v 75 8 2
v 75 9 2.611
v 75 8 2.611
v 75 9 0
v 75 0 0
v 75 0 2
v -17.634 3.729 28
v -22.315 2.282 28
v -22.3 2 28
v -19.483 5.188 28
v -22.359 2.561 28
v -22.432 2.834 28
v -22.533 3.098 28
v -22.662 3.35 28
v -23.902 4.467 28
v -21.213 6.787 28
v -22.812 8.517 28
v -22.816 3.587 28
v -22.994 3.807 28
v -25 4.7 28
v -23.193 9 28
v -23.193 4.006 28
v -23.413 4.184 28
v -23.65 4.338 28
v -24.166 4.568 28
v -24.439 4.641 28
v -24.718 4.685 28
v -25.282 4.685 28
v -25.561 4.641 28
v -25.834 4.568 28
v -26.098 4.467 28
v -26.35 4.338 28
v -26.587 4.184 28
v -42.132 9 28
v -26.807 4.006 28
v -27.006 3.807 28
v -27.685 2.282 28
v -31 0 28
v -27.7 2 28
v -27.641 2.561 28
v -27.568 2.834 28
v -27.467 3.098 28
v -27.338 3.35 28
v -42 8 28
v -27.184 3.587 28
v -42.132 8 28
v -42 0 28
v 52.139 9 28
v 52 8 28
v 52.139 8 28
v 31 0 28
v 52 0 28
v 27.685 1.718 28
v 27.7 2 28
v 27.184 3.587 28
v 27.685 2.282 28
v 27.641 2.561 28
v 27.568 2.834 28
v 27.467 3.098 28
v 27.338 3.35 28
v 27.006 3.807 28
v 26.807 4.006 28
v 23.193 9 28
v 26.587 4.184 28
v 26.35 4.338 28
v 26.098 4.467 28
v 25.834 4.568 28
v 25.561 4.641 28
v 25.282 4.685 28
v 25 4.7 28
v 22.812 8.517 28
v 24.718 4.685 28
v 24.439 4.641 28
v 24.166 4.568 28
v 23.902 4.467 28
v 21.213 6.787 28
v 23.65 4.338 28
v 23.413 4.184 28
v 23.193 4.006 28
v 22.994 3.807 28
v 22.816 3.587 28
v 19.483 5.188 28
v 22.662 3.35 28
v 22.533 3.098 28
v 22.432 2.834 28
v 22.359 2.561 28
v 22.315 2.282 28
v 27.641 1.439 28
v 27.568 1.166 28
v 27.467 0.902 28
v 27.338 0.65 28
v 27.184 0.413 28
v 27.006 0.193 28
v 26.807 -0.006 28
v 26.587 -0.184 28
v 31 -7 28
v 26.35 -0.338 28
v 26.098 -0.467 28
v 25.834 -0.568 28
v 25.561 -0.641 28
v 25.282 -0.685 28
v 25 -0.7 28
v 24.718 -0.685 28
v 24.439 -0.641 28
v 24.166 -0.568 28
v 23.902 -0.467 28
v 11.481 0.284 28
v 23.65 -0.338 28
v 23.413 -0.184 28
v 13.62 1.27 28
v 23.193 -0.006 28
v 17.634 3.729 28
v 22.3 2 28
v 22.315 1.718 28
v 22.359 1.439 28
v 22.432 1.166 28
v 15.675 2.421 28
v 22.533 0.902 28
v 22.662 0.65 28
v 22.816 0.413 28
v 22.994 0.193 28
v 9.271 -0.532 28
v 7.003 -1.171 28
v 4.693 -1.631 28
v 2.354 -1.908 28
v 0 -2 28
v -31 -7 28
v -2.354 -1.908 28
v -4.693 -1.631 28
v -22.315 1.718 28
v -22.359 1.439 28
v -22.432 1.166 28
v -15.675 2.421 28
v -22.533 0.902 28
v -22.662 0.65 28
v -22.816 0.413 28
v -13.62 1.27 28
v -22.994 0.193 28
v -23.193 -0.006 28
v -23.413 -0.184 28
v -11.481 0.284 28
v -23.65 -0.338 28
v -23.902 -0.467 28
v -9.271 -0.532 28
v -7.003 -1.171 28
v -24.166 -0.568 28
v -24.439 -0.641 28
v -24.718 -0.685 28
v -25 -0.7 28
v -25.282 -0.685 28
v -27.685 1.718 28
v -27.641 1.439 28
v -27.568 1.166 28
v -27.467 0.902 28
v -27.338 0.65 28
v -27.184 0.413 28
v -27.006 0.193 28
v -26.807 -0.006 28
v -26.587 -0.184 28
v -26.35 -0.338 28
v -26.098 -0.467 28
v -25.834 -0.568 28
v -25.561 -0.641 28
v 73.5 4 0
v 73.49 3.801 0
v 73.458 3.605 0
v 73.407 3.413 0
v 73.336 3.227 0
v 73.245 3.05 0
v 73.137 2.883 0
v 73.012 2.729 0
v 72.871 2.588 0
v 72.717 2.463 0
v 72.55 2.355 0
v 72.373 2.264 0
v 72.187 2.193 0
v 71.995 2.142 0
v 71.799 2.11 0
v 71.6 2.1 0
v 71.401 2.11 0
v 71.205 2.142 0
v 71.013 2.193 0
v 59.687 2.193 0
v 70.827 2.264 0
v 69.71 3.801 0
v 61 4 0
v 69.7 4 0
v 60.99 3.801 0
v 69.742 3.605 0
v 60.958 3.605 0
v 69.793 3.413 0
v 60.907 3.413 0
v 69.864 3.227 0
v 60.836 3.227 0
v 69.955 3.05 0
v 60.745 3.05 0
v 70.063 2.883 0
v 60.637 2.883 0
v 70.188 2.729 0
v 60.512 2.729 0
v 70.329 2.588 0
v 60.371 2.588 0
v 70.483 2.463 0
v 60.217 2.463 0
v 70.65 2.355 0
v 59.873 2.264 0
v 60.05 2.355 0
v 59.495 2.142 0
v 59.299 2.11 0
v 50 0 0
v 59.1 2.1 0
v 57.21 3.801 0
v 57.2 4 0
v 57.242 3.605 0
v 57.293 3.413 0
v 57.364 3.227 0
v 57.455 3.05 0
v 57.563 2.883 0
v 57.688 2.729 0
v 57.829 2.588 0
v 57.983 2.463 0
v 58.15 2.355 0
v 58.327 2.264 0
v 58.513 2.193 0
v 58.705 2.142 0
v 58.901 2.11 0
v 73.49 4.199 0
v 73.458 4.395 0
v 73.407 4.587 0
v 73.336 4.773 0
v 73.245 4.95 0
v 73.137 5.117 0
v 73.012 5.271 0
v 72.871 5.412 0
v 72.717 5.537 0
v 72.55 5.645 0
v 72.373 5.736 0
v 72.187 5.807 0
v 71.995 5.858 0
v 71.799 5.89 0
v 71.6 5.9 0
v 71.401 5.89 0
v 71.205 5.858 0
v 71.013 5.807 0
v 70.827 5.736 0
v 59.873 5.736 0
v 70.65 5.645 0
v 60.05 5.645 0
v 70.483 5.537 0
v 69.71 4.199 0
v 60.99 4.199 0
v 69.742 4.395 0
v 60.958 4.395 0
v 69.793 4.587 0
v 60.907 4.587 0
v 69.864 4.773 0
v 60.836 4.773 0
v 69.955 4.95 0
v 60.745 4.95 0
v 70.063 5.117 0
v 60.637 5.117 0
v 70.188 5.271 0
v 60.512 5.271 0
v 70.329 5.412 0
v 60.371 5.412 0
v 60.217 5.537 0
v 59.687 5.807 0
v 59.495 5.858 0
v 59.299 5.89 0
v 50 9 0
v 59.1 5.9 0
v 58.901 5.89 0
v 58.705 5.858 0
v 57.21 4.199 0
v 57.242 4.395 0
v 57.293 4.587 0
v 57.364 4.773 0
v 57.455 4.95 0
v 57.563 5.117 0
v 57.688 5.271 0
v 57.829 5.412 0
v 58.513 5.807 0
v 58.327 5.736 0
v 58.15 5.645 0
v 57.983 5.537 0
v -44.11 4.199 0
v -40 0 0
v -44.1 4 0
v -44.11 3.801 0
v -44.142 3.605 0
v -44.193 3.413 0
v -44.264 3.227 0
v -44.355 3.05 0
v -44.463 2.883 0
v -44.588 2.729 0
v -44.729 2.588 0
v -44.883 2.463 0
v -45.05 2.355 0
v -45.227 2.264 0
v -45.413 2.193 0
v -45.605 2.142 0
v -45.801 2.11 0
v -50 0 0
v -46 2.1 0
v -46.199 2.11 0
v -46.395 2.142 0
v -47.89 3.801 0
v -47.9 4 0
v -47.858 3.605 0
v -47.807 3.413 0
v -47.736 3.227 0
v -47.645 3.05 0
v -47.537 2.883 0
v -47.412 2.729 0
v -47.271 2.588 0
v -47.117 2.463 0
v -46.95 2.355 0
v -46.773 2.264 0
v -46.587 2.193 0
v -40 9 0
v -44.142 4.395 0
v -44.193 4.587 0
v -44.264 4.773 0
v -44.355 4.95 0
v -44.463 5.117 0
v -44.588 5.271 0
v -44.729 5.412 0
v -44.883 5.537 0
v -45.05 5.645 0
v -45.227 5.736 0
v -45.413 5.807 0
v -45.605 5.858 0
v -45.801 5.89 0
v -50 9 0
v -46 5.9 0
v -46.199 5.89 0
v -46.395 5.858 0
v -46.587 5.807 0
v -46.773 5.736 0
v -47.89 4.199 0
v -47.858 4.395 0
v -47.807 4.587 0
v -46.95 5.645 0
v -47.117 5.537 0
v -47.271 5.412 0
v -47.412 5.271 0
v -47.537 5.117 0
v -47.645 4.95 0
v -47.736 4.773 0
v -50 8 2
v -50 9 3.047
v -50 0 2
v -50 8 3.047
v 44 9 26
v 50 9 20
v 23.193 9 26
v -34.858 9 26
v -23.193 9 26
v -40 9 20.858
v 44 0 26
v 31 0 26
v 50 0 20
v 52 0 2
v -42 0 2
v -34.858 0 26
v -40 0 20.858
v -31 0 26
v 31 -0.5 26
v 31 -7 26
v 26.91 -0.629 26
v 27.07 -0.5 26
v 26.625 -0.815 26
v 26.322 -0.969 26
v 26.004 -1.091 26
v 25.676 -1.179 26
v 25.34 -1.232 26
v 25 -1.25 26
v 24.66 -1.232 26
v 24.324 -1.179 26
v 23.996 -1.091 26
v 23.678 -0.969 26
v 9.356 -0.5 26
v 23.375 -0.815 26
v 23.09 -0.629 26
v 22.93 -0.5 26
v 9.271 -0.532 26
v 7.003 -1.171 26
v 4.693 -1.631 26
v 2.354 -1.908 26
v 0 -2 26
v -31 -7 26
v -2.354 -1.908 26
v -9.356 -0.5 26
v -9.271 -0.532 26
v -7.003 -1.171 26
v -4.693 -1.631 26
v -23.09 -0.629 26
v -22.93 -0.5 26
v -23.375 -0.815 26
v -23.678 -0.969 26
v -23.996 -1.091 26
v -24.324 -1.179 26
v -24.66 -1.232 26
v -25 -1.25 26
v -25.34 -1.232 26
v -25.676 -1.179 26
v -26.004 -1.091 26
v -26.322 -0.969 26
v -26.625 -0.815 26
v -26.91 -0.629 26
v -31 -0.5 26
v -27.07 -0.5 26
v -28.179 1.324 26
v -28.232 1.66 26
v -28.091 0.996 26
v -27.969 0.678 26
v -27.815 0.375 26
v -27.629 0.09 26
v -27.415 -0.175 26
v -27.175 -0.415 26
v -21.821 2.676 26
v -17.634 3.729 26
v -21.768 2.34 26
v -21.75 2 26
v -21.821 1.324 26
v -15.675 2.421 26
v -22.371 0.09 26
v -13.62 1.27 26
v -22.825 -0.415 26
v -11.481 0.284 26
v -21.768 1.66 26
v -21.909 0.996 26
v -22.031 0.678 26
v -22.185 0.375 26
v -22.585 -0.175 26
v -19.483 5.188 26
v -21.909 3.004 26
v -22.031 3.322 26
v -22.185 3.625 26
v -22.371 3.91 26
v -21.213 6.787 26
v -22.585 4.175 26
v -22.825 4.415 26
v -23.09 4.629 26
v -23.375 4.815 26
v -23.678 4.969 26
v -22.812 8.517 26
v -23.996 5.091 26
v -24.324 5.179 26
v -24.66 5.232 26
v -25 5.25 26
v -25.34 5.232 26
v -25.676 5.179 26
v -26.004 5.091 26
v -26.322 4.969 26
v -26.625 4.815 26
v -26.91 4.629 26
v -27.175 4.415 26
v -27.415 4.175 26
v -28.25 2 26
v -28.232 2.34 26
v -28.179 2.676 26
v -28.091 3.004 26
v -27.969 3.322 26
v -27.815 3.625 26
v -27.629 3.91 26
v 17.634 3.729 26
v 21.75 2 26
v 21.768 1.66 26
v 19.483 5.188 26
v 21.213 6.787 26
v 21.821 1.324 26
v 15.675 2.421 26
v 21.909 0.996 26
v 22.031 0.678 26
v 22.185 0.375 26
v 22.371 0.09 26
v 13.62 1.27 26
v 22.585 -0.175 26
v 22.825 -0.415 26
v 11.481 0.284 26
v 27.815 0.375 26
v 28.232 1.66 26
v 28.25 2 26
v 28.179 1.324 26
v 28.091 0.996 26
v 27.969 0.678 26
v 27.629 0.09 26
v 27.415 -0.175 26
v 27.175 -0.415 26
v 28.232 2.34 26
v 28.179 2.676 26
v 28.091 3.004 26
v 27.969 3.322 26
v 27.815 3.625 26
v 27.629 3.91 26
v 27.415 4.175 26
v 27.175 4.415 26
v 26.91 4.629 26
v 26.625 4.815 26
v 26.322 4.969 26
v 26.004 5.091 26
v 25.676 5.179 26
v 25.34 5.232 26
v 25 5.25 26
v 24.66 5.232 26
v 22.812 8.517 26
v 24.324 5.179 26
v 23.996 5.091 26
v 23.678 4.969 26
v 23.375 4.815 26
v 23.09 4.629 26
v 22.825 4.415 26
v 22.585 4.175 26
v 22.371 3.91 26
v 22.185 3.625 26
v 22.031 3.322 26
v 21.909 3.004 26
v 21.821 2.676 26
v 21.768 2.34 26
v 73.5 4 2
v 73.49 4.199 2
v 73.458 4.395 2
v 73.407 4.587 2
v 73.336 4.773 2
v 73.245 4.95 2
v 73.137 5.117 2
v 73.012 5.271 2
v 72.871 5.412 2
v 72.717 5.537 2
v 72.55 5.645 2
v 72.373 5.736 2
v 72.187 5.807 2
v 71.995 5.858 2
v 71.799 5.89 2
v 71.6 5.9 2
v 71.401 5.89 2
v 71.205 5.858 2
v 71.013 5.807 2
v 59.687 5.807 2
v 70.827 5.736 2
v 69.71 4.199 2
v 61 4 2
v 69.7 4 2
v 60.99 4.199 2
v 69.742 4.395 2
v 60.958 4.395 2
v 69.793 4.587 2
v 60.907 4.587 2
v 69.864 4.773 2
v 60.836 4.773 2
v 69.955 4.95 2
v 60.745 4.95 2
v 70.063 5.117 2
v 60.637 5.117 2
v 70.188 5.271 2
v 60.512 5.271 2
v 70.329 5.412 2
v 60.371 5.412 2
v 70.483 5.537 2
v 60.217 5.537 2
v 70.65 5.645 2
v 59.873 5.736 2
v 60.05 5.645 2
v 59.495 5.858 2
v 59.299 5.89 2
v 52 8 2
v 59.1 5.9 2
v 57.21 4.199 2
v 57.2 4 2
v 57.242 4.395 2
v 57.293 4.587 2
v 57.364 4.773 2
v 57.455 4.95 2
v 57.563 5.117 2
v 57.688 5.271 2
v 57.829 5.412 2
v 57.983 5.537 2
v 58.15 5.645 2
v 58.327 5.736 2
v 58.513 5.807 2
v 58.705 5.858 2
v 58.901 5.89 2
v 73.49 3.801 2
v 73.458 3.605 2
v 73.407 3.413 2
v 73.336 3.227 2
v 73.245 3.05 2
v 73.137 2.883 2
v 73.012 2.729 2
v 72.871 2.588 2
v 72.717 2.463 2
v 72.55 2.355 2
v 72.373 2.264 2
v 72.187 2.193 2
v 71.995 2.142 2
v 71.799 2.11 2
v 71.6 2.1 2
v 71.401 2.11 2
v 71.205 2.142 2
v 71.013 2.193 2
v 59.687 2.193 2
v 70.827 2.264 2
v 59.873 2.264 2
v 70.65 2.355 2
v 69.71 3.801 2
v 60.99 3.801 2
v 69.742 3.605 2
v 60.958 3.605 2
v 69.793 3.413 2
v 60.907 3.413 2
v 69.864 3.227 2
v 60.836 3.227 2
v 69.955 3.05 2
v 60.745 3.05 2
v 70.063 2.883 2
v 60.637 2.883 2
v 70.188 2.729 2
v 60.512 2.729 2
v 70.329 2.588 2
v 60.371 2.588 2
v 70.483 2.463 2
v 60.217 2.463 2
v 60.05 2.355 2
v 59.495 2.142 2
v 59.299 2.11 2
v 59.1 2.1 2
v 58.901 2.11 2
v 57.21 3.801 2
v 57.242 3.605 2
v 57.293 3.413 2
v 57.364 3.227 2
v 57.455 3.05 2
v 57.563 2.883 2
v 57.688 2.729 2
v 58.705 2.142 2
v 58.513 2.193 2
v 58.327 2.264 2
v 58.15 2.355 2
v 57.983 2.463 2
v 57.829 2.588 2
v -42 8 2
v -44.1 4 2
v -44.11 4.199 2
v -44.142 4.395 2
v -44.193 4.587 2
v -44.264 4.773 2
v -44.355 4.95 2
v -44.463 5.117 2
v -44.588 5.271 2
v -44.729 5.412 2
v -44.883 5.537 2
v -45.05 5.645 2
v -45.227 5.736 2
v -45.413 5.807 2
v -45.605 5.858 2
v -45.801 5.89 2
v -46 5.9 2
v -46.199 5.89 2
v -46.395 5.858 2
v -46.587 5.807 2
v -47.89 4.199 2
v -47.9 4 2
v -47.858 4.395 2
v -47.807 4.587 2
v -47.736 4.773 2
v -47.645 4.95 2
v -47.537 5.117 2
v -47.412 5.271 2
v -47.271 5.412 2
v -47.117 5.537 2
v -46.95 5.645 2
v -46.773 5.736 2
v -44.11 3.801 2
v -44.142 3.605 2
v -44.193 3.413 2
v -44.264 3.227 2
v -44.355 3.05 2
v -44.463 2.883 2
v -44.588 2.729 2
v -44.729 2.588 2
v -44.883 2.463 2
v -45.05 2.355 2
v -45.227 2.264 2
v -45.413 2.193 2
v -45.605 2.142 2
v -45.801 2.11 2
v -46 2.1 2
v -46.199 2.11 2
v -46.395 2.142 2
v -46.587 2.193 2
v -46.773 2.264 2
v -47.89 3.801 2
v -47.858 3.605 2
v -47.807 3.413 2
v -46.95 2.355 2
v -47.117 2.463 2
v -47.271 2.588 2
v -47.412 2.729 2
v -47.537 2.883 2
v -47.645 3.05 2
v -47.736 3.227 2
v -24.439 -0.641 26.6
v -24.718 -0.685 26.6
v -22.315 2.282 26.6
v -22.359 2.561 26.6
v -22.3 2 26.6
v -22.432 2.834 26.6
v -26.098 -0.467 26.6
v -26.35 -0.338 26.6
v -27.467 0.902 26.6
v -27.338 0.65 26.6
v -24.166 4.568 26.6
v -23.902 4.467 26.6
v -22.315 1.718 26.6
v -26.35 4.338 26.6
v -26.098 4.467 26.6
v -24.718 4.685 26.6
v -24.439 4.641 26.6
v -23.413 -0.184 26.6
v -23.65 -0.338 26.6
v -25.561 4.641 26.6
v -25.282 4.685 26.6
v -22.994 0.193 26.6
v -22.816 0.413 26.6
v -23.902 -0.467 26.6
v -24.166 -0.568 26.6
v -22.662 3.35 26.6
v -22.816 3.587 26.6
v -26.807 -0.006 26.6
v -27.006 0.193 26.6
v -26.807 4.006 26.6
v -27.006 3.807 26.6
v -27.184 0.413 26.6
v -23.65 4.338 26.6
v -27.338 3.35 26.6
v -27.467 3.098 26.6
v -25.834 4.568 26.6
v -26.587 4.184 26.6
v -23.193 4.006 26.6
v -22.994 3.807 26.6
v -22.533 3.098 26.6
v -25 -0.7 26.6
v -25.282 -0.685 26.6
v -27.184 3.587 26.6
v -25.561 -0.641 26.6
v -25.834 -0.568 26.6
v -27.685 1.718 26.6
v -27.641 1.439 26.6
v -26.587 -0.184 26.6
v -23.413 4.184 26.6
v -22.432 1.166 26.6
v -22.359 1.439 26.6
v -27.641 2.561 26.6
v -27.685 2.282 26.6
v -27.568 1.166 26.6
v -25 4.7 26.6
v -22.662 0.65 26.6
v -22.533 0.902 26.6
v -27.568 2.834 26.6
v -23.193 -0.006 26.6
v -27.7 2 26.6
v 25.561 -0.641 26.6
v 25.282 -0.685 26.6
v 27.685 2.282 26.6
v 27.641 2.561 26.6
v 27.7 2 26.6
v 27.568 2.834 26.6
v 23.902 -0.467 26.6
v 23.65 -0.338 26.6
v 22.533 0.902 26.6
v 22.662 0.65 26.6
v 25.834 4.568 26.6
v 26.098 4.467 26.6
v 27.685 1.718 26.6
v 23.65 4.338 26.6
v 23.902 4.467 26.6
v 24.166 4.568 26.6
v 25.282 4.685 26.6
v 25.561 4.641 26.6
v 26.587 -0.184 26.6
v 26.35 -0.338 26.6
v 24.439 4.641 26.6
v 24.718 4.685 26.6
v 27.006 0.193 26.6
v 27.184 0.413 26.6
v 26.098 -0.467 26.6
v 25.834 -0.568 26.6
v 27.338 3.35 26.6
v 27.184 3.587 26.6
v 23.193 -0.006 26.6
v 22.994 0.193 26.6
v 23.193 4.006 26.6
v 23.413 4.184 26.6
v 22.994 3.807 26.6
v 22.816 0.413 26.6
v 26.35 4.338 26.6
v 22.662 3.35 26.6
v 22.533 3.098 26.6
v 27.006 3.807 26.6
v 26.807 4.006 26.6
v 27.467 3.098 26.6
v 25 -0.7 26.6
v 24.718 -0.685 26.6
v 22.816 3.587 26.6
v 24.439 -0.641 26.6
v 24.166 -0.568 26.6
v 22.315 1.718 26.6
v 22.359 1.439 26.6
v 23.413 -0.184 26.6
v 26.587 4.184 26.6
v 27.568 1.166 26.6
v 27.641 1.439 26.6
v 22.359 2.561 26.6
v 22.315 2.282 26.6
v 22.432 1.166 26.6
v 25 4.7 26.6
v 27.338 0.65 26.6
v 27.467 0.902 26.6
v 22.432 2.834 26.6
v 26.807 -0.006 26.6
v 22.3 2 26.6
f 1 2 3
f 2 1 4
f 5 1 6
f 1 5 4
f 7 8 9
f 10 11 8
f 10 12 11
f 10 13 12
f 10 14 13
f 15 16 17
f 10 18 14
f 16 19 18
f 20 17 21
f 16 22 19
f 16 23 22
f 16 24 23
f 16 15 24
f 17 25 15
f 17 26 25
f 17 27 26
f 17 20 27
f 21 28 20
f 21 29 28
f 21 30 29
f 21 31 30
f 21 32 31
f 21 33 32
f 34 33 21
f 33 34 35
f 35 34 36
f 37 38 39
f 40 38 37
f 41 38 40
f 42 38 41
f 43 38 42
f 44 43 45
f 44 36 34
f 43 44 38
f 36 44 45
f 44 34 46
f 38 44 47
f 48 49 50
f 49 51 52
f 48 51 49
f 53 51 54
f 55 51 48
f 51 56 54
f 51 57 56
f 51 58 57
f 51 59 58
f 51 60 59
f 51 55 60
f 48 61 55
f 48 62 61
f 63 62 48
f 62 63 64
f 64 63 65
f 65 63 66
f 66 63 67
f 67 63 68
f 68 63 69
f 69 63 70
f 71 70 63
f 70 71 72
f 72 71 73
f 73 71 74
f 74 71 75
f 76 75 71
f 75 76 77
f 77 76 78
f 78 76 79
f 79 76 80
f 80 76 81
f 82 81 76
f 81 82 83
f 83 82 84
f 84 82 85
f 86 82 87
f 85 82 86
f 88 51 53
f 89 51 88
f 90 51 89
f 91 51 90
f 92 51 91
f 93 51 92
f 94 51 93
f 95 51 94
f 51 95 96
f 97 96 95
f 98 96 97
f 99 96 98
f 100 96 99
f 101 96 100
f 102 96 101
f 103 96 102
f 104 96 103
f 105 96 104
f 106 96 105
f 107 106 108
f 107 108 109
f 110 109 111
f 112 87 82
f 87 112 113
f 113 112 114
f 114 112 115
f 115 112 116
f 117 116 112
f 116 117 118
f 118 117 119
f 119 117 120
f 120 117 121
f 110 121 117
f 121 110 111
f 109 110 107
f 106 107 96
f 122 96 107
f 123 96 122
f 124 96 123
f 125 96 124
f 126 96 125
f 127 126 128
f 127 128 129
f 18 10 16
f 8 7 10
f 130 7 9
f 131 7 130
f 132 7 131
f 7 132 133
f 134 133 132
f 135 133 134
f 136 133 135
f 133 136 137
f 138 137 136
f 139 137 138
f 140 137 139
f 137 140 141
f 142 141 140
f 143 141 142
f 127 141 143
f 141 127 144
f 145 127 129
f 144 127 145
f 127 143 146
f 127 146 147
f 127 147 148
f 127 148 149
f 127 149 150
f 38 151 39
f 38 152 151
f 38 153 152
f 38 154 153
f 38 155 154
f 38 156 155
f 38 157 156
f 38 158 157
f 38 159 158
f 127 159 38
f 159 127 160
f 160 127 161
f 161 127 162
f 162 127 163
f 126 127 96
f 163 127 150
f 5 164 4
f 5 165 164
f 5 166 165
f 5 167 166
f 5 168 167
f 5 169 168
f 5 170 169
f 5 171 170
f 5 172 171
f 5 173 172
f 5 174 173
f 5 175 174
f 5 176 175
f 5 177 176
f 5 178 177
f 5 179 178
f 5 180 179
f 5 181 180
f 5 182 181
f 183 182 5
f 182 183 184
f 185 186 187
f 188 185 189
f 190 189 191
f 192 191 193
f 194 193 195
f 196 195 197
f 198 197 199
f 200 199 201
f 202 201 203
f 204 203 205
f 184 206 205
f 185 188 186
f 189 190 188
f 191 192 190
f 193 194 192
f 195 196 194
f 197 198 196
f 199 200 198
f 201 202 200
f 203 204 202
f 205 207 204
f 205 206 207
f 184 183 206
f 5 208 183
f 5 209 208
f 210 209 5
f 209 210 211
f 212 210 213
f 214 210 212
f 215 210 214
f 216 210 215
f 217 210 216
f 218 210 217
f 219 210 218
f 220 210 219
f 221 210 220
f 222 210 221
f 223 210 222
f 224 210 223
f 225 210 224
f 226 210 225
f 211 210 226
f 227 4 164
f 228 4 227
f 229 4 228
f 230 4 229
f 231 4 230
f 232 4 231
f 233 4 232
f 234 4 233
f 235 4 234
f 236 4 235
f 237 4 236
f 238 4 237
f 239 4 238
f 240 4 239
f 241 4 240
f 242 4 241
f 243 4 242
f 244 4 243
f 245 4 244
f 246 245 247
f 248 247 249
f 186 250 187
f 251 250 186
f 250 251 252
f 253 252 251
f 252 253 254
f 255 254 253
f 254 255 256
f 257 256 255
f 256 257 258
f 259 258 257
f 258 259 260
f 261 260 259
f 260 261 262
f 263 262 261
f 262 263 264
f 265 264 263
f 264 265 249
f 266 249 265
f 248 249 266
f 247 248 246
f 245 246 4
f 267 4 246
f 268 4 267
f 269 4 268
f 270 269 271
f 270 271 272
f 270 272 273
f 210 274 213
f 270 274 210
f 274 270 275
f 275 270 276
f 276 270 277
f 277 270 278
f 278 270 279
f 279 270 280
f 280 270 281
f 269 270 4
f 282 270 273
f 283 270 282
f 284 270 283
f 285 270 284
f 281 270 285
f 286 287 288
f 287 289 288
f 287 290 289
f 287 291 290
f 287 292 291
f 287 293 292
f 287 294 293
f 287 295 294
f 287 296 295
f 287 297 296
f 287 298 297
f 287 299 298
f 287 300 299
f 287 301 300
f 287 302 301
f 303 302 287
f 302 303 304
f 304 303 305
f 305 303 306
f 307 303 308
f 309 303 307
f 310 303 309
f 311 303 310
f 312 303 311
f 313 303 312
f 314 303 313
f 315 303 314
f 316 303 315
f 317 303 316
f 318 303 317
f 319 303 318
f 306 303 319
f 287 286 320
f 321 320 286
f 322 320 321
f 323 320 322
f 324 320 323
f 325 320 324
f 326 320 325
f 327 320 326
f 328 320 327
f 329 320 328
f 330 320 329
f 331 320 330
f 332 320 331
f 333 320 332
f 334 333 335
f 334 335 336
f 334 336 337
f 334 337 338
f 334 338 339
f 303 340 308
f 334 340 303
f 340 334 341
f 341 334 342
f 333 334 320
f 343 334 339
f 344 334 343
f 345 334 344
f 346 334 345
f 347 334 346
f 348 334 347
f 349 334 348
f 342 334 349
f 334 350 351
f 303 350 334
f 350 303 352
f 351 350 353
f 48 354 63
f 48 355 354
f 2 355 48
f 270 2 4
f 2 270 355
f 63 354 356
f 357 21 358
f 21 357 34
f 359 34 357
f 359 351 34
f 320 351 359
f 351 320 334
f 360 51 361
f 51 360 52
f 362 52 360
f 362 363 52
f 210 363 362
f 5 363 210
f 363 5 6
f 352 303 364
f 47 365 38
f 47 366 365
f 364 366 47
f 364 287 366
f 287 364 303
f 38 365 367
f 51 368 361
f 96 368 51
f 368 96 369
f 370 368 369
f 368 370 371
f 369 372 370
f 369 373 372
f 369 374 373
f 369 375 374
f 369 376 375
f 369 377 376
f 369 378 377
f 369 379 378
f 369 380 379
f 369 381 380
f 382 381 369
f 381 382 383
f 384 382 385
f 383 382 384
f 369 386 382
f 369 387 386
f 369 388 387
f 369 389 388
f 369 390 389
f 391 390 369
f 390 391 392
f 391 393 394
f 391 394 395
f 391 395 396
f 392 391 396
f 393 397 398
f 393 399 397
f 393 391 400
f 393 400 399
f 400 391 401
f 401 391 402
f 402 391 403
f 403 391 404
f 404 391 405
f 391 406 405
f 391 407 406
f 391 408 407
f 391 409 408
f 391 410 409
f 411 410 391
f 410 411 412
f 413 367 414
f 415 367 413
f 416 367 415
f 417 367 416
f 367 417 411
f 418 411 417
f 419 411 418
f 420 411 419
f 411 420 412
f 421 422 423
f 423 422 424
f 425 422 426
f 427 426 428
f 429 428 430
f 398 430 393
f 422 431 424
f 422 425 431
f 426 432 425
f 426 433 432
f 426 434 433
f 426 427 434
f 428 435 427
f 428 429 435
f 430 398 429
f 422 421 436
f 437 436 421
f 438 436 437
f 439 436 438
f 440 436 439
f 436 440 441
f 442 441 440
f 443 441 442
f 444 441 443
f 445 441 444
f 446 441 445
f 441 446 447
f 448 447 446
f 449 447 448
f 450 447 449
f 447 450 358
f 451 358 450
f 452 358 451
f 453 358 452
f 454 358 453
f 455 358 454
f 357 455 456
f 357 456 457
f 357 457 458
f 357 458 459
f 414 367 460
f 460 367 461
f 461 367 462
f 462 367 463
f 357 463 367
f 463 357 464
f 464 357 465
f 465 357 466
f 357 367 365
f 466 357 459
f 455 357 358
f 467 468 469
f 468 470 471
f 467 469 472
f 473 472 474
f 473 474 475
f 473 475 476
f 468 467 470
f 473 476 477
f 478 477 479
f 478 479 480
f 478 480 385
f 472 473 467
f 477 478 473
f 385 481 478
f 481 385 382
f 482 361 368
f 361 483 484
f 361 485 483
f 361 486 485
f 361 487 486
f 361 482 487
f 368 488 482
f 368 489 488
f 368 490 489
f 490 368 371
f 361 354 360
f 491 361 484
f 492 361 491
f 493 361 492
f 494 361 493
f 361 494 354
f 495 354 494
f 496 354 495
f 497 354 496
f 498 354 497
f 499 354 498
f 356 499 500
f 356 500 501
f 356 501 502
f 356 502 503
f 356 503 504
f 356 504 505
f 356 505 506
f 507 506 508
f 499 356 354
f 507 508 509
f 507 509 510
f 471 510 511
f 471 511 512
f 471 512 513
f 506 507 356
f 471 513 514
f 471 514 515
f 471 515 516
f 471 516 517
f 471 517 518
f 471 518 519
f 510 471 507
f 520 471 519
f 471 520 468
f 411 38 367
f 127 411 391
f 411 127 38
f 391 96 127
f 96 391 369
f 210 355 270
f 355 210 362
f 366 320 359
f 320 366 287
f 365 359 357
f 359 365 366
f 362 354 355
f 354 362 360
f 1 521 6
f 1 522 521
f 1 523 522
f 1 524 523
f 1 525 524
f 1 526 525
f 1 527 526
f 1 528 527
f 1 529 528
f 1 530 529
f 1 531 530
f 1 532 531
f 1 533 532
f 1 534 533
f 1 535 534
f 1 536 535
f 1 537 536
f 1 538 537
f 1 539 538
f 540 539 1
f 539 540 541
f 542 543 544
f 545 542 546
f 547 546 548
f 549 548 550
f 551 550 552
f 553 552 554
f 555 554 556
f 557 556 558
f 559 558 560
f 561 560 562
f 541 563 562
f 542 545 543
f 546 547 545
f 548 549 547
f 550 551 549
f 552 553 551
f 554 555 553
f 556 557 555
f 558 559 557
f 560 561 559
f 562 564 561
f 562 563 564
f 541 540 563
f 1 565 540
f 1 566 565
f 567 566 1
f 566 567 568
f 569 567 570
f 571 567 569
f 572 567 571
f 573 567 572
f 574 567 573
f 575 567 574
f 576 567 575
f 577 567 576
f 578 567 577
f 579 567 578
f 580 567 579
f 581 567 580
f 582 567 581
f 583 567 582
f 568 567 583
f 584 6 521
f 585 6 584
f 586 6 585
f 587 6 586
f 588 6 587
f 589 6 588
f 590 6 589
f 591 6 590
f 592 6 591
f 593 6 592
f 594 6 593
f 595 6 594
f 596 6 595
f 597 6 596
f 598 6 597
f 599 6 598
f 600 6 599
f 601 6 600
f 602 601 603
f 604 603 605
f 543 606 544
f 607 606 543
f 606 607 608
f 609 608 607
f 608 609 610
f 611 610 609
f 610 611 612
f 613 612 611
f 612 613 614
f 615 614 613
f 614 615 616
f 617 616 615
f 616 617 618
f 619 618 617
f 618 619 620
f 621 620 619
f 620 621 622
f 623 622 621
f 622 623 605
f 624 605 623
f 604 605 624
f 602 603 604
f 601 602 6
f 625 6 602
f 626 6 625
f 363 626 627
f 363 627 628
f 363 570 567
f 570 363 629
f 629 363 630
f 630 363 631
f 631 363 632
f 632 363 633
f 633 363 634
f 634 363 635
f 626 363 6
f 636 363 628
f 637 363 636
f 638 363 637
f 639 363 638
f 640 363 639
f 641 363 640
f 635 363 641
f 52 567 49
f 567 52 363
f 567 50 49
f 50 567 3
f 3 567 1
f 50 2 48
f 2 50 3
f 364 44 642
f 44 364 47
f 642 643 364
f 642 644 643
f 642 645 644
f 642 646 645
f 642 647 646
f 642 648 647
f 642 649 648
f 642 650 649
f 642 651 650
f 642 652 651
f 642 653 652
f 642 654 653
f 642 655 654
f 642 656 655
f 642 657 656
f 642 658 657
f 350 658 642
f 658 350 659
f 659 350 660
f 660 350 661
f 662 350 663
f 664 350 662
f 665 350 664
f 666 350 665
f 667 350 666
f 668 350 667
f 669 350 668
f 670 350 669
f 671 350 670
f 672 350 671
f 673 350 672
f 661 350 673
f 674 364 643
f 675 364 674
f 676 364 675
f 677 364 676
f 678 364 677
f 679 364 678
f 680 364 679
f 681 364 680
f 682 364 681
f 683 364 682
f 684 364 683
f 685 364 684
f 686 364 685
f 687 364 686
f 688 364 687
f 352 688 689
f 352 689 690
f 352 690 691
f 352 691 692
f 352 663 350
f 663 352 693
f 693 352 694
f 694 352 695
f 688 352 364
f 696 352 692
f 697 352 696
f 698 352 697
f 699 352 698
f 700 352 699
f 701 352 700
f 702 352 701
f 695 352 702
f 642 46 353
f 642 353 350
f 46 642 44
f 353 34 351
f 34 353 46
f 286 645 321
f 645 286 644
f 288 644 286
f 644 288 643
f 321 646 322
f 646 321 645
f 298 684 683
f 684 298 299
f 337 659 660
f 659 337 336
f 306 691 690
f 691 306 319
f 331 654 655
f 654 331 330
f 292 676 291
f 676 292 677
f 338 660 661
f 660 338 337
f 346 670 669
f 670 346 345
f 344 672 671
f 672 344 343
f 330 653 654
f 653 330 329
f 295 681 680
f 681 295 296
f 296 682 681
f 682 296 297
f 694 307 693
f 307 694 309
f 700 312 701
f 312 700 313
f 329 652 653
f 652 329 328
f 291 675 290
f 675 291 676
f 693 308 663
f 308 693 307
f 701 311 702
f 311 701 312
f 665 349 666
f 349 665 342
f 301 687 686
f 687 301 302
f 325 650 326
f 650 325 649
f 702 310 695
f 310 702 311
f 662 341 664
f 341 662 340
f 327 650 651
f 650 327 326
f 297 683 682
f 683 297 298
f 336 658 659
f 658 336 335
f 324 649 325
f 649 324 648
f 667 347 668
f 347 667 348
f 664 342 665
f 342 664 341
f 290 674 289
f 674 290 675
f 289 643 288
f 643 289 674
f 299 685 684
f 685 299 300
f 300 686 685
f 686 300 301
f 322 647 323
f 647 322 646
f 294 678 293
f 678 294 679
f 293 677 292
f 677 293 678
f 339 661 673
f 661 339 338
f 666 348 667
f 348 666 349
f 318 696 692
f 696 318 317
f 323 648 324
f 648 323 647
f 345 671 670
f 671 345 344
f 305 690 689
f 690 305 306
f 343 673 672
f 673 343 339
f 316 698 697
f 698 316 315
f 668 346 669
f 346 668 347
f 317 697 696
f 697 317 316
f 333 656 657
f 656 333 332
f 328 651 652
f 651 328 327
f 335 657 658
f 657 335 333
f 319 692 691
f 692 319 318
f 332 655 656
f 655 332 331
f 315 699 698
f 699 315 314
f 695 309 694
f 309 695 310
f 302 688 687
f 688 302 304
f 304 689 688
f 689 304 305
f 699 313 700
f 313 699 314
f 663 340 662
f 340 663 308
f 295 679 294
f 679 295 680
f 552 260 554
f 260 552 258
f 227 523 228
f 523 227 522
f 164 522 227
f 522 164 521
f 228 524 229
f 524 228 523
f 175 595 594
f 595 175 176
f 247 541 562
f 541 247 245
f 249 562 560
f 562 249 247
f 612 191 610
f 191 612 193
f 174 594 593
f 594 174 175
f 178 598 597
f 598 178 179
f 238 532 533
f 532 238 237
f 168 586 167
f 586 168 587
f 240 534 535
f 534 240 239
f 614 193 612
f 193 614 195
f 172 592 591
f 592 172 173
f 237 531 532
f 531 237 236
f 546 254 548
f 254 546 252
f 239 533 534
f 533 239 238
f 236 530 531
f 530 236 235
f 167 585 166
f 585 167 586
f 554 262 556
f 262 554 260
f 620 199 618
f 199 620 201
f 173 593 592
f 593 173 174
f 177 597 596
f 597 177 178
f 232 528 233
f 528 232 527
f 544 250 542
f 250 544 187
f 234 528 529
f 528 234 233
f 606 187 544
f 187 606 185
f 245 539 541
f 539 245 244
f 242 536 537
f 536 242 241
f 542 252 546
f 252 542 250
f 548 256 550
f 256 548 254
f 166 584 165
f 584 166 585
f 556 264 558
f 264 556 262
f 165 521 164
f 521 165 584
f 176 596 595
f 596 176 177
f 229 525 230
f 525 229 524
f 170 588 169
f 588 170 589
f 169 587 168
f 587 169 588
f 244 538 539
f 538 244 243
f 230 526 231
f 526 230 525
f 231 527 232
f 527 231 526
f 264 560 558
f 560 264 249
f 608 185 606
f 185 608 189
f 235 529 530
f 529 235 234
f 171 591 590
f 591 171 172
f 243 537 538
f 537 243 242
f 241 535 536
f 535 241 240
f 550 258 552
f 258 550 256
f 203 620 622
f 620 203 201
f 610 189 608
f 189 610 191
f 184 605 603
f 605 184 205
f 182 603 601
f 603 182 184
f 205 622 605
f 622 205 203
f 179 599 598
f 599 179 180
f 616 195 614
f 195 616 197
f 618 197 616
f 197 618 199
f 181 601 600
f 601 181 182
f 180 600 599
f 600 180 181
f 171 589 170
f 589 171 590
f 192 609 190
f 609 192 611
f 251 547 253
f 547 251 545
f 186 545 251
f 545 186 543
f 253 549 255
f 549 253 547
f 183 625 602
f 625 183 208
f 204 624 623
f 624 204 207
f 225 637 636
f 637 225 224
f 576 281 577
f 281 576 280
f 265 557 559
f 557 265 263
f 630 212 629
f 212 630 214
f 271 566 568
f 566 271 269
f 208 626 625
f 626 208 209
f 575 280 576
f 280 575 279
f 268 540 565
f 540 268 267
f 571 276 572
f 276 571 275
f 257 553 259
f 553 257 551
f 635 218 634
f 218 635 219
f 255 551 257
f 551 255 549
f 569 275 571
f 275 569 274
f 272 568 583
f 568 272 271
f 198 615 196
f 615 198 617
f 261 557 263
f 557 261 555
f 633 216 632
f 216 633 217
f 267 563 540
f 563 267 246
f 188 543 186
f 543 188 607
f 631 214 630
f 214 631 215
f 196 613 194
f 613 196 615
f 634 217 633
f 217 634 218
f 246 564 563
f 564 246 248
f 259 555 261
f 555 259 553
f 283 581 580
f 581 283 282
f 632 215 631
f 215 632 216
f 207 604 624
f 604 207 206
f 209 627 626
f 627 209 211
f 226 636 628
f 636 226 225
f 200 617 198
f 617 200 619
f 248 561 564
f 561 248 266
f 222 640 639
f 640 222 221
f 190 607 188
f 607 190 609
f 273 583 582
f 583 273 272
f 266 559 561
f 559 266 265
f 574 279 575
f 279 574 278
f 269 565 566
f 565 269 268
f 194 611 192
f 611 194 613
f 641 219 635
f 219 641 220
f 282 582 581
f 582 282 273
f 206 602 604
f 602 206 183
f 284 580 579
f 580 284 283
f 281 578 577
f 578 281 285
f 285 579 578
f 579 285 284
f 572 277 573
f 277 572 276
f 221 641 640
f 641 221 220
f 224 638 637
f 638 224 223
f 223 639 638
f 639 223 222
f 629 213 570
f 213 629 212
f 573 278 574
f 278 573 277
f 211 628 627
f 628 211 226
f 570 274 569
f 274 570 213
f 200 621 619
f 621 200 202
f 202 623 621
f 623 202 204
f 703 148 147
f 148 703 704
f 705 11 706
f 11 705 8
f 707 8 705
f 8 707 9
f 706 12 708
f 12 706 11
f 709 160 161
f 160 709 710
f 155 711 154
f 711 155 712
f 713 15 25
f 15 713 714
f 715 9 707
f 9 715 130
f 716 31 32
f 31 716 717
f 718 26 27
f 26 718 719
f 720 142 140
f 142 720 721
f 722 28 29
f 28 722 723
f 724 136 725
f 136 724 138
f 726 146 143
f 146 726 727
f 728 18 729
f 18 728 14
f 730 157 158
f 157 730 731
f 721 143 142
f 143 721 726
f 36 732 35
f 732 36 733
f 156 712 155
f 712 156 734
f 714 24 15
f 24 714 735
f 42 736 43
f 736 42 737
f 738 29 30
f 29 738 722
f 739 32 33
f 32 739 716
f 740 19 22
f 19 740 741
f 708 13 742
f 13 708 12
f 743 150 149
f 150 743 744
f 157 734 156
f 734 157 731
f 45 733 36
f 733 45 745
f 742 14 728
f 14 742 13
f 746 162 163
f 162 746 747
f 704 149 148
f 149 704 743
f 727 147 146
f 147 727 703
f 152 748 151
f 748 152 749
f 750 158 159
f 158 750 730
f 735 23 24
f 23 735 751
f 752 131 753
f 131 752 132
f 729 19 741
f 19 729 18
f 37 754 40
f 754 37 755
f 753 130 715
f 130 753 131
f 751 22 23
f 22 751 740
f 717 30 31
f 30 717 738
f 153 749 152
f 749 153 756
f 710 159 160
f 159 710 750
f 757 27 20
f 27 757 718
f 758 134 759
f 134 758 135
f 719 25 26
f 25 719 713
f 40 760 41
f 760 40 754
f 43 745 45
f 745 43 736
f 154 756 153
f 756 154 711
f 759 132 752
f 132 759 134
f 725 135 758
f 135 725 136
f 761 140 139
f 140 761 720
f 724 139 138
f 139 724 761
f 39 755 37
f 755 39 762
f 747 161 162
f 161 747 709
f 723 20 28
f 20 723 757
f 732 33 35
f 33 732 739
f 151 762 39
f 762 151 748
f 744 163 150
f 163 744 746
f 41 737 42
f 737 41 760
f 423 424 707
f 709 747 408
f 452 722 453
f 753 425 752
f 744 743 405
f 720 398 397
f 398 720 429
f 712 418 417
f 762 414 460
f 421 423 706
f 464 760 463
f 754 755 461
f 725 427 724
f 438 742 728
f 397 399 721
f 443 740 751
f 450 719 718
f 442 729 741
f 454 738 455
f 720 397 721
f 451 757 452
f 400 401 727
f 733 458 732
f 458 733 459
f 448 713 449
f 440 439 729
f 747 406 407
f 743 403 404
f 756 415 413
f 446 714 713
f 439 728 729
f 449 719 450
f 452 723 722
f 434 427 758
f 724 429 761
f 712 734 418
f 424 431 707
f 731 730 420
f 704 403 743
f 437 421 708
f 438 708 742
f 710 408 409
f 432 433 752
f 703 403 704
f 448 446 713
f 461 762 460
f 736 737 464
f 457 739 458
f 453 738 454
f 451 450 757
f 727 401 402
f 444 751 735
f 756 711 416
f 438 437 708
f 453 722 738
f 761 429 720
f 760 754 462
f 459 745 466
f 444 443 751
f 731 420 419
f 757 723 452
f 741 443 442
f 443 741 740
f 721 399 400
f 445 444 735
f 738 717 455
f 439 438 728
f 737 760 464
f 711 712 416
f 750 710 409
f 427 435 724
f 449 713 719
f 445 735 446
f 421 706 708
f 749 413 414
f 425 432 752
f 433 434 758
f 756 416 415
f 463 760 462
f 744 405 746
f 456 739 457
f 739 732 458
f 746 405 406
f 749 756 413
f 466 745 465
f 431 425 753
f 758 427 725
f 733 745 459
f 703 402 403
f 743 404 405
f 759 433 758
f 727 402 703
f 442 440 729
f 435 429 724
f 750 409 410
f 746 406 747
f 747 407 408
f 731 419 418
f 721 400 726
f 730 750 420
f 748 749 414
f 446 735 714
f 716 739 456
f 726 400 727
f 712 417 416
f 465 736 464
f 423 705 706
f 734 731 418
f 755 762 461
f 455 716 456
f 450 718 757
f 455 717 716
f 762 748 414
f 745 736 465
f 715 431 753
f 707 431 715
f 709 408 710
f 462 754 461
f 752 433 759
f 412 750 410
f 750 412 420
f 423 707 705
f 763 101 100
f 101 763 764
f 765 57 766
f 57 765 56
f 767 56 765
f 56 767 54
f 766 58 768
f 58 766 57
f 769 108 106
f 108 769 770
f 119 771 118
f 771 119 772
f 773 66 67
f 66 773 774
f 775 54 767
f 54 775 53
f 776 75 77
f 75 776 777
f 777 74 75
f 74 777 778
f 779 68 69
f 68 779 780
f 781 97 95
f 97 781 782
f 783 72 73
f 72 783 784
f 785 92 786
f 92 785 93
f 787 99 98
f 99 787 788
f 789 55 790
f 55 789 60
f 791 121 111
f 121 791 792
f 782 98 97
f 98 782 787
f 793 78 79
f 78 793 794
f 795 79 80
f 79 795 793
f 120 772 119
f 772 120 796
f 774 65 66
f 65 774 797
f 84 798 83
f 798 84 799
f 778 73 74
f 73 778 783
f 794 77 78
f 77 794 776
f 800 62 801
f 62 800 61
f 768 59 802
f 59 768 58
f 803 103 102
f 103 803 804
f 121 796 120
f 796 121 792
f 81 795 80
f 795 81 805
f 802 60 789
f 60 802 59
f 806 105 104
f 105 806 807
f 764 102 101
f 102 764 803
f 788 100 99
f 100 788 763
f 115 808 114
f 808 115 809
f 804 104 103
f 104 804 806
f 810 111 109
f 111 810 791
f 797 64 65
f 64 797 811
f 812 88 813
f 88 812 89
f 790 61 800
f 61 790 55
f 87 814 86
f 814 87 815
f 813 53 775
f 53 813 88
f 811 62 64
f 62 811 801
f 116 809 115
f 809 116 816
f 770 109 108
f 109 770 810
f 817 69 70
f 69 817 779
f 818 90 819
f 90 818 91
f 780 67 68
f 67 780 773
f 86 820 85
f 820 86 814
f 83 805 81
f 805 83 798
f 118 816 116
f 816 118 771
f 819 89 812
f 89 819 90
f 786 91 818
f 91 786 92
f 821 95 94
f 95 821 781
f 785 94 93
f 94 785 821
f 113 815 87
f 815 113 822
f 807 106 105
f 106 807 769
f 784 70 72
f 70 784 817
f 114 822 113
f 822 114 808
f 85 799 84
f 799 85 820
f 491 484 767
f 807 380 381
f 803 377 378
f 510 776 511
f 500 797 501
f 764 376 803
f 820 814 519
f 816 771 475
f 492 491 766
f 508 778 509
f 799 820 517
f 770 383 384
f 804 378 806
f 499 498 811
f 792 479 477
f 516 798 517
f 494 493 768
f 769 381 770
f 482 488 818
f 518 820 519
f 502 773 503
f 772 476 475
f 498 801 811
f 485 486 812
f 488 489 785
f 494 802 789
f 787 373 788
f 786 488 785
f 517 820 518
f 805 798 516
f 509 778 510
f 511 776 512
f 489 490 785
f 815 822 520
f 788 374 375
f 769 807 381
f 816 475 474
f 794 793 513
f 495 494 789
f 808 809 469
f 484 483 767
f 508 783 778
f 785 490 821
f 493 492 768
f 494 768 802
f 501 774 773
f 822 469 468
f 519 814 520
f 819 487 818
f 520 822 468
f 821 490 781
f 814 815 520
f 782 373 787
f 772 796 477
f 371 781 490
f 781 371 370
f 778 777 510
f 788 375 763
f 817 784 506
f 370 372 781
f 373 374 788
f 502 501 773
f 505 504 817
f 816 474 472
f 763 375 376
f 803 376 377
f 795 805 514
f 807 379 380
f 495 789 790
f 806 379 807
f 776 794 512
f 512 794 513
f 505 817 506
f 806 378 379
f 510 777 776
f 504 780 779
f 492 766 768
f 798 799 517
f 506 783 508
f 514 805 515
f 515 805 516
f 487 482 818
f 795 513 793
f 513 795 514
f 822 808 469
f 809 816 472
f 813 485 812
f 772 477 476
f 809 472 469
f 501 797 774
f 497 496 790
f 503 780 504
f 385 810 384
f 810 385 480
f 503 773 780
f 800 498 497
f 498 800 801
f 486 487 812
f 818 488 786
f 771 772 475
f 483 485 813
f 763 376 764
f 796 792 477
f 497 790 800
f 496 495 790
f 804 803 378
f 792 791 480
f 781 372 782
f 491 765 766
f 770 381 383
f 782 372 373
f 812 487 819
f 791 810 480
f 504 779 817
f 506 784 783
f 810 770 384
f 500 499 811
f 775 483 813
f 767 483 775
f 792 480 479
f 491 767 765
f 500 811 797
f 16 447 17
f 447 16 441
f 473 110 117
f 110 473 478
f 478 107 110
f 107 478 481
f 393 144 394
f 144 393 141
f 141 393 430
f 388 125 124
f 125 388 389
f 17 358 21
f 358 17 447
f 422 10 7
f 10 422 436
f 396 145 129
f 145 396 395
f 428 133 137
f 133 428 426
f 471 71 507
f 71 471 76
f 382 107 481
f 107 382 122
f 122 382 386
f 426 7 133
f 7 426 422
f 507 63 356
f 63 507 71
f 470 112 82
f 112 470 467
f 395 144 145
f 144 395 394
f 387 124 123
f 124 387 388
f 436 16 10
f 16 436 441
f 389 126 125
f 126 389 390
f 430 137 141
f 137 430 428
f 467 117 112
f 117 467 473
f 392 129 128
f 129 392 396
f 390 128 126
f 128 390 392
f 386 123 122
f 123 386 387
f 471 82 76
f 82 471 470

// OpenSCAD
// Lüfter-Halterung Anzcubic i3 Mega-S (ohne Hub-Platine)
//
// TODO:
// - Luefter ist nicht mittig: muss 3mm nach rechts
// - Öffnung 2mm nach unten und fr1 1mm kleiner
// - Lueftersockel ecken abrunden / schöner machen
// - Loch 3 kann 0,25 mm nach links (und durch 3mm Zylinder ersetzt werden)
// 

t = 0.001; // tolerance

plate_height = 2;

fan_box_height = 10;

// Lochradius M3 Schrauben
sr1 = 3.8 / 2;

// Lüfterschrauben-Lochdurchmesser / Phase
sr2 = 5.4 / 2;
sr3 = 6.5 / 2;

// Lüfter-Aussparung
fr1 = 60 / 2;

difference() {

    union() {
        // Hauptkörper
        translate([-50, 0, 0])
            cube([125, 9, 28]);

        // Lueftersockel
        translate([-31, -7, 28 - plate_height])
            cube([62, 15, plate_height]);
    }

    difference() {
        // Motorstecker-Aussparung
        translate([-40, -0.5, -1])
            cube([90, 10, 27]);

        // Motorstecker-Aussparung (ecke links)
        translate([-50, -0.5, 25])
            rotate([0, 45, 0])
                cube([10, 10, 20]);

        // Motorstecker-Aussparung (ecke rechts)
        translate([50, -0.5, 20])
            rotate([0, -45, 0])
                cube([10, 10, 20]);

    }

    // rechte Aussparung
    translate([52, -2, 2])
        cube([25, 10, 30]);

    // rechte Abschrägung
    translate([76, 0, 1.5])
        rotate([0,-42,0])
            cube([25, 10, 37]);

    // linke Aussparung
    translate([-52, -2, 2])
        cube([10, 10, 30]);

    // linke Abschrägung
    translate([-60.5,5,3])
        rotate([0,17.5,0])
            cube([10, 10, 30]);

    // Loch 1 (links)
    translate([-46, 4, -10])
        cylinder(h = 30, r1 = sr1, r2 = sr1, $fn = 60);

    // Loch 2 (ganz außen)
    translate([117.6 - 46, 4, -10])
        cylinder(h = 30, r1 = sr1, r2 = sr1, $fn = 60);

    // Loch 3 (rechts innen)
    translate([117.6 - 46 - 12.5, 4, -10])
        cylinder(h = 30, r1 = sr1, r2 = sr1, $fn = 60);        

    // Luefter Loch 1 (Bohrung)
    translate([-25, 2, 15])
        cylinder(h = 30, r1 = sr2, r2 = sr2, $fn = 60);

    // Luefter Loch 2 (Phase)
    translate([-25, 2, 26])
        cylinder(h = 0.6, r1 = sr3, r2 = sr2, $fn = 60);

    // Luefter Loch 2 (rechts)
    translate([25, 2, 15])
        cylinder(h = 30, r1 = sr2, r2 = sr2, $fn = 60);

    // Luefter Loch 2 (rechts)
    translate([25, 2, 26])
        cylinder(h = 0.6, r1 = sr3, r2 = sr2, $fn = 60);


    // Lüfter-Loch
    translate([0, 28, 0])
        cylinder(h = 30, r1 = fr1, r2 = fr1, $fn = 80);

}

// // Stuetzblock
// translate([32, -28, -21])
//     cube([10, 18, 10 + t]);

// // Loch 1  tiefer
// translate([117.6 - 46 - 33.4, 4 - 17.1, -25])
//   cylinder(h = 30, r1 = sr1, r2 = sr1, $fn = 60);

// // Loch 2  tiefer
// translate([117.6 - 46 - 33.4, 4 - 17.1 - 11.14, -25])
//   cylinder(h = 30, r1 = sr1, r2 = sr1, $fn = 60);
